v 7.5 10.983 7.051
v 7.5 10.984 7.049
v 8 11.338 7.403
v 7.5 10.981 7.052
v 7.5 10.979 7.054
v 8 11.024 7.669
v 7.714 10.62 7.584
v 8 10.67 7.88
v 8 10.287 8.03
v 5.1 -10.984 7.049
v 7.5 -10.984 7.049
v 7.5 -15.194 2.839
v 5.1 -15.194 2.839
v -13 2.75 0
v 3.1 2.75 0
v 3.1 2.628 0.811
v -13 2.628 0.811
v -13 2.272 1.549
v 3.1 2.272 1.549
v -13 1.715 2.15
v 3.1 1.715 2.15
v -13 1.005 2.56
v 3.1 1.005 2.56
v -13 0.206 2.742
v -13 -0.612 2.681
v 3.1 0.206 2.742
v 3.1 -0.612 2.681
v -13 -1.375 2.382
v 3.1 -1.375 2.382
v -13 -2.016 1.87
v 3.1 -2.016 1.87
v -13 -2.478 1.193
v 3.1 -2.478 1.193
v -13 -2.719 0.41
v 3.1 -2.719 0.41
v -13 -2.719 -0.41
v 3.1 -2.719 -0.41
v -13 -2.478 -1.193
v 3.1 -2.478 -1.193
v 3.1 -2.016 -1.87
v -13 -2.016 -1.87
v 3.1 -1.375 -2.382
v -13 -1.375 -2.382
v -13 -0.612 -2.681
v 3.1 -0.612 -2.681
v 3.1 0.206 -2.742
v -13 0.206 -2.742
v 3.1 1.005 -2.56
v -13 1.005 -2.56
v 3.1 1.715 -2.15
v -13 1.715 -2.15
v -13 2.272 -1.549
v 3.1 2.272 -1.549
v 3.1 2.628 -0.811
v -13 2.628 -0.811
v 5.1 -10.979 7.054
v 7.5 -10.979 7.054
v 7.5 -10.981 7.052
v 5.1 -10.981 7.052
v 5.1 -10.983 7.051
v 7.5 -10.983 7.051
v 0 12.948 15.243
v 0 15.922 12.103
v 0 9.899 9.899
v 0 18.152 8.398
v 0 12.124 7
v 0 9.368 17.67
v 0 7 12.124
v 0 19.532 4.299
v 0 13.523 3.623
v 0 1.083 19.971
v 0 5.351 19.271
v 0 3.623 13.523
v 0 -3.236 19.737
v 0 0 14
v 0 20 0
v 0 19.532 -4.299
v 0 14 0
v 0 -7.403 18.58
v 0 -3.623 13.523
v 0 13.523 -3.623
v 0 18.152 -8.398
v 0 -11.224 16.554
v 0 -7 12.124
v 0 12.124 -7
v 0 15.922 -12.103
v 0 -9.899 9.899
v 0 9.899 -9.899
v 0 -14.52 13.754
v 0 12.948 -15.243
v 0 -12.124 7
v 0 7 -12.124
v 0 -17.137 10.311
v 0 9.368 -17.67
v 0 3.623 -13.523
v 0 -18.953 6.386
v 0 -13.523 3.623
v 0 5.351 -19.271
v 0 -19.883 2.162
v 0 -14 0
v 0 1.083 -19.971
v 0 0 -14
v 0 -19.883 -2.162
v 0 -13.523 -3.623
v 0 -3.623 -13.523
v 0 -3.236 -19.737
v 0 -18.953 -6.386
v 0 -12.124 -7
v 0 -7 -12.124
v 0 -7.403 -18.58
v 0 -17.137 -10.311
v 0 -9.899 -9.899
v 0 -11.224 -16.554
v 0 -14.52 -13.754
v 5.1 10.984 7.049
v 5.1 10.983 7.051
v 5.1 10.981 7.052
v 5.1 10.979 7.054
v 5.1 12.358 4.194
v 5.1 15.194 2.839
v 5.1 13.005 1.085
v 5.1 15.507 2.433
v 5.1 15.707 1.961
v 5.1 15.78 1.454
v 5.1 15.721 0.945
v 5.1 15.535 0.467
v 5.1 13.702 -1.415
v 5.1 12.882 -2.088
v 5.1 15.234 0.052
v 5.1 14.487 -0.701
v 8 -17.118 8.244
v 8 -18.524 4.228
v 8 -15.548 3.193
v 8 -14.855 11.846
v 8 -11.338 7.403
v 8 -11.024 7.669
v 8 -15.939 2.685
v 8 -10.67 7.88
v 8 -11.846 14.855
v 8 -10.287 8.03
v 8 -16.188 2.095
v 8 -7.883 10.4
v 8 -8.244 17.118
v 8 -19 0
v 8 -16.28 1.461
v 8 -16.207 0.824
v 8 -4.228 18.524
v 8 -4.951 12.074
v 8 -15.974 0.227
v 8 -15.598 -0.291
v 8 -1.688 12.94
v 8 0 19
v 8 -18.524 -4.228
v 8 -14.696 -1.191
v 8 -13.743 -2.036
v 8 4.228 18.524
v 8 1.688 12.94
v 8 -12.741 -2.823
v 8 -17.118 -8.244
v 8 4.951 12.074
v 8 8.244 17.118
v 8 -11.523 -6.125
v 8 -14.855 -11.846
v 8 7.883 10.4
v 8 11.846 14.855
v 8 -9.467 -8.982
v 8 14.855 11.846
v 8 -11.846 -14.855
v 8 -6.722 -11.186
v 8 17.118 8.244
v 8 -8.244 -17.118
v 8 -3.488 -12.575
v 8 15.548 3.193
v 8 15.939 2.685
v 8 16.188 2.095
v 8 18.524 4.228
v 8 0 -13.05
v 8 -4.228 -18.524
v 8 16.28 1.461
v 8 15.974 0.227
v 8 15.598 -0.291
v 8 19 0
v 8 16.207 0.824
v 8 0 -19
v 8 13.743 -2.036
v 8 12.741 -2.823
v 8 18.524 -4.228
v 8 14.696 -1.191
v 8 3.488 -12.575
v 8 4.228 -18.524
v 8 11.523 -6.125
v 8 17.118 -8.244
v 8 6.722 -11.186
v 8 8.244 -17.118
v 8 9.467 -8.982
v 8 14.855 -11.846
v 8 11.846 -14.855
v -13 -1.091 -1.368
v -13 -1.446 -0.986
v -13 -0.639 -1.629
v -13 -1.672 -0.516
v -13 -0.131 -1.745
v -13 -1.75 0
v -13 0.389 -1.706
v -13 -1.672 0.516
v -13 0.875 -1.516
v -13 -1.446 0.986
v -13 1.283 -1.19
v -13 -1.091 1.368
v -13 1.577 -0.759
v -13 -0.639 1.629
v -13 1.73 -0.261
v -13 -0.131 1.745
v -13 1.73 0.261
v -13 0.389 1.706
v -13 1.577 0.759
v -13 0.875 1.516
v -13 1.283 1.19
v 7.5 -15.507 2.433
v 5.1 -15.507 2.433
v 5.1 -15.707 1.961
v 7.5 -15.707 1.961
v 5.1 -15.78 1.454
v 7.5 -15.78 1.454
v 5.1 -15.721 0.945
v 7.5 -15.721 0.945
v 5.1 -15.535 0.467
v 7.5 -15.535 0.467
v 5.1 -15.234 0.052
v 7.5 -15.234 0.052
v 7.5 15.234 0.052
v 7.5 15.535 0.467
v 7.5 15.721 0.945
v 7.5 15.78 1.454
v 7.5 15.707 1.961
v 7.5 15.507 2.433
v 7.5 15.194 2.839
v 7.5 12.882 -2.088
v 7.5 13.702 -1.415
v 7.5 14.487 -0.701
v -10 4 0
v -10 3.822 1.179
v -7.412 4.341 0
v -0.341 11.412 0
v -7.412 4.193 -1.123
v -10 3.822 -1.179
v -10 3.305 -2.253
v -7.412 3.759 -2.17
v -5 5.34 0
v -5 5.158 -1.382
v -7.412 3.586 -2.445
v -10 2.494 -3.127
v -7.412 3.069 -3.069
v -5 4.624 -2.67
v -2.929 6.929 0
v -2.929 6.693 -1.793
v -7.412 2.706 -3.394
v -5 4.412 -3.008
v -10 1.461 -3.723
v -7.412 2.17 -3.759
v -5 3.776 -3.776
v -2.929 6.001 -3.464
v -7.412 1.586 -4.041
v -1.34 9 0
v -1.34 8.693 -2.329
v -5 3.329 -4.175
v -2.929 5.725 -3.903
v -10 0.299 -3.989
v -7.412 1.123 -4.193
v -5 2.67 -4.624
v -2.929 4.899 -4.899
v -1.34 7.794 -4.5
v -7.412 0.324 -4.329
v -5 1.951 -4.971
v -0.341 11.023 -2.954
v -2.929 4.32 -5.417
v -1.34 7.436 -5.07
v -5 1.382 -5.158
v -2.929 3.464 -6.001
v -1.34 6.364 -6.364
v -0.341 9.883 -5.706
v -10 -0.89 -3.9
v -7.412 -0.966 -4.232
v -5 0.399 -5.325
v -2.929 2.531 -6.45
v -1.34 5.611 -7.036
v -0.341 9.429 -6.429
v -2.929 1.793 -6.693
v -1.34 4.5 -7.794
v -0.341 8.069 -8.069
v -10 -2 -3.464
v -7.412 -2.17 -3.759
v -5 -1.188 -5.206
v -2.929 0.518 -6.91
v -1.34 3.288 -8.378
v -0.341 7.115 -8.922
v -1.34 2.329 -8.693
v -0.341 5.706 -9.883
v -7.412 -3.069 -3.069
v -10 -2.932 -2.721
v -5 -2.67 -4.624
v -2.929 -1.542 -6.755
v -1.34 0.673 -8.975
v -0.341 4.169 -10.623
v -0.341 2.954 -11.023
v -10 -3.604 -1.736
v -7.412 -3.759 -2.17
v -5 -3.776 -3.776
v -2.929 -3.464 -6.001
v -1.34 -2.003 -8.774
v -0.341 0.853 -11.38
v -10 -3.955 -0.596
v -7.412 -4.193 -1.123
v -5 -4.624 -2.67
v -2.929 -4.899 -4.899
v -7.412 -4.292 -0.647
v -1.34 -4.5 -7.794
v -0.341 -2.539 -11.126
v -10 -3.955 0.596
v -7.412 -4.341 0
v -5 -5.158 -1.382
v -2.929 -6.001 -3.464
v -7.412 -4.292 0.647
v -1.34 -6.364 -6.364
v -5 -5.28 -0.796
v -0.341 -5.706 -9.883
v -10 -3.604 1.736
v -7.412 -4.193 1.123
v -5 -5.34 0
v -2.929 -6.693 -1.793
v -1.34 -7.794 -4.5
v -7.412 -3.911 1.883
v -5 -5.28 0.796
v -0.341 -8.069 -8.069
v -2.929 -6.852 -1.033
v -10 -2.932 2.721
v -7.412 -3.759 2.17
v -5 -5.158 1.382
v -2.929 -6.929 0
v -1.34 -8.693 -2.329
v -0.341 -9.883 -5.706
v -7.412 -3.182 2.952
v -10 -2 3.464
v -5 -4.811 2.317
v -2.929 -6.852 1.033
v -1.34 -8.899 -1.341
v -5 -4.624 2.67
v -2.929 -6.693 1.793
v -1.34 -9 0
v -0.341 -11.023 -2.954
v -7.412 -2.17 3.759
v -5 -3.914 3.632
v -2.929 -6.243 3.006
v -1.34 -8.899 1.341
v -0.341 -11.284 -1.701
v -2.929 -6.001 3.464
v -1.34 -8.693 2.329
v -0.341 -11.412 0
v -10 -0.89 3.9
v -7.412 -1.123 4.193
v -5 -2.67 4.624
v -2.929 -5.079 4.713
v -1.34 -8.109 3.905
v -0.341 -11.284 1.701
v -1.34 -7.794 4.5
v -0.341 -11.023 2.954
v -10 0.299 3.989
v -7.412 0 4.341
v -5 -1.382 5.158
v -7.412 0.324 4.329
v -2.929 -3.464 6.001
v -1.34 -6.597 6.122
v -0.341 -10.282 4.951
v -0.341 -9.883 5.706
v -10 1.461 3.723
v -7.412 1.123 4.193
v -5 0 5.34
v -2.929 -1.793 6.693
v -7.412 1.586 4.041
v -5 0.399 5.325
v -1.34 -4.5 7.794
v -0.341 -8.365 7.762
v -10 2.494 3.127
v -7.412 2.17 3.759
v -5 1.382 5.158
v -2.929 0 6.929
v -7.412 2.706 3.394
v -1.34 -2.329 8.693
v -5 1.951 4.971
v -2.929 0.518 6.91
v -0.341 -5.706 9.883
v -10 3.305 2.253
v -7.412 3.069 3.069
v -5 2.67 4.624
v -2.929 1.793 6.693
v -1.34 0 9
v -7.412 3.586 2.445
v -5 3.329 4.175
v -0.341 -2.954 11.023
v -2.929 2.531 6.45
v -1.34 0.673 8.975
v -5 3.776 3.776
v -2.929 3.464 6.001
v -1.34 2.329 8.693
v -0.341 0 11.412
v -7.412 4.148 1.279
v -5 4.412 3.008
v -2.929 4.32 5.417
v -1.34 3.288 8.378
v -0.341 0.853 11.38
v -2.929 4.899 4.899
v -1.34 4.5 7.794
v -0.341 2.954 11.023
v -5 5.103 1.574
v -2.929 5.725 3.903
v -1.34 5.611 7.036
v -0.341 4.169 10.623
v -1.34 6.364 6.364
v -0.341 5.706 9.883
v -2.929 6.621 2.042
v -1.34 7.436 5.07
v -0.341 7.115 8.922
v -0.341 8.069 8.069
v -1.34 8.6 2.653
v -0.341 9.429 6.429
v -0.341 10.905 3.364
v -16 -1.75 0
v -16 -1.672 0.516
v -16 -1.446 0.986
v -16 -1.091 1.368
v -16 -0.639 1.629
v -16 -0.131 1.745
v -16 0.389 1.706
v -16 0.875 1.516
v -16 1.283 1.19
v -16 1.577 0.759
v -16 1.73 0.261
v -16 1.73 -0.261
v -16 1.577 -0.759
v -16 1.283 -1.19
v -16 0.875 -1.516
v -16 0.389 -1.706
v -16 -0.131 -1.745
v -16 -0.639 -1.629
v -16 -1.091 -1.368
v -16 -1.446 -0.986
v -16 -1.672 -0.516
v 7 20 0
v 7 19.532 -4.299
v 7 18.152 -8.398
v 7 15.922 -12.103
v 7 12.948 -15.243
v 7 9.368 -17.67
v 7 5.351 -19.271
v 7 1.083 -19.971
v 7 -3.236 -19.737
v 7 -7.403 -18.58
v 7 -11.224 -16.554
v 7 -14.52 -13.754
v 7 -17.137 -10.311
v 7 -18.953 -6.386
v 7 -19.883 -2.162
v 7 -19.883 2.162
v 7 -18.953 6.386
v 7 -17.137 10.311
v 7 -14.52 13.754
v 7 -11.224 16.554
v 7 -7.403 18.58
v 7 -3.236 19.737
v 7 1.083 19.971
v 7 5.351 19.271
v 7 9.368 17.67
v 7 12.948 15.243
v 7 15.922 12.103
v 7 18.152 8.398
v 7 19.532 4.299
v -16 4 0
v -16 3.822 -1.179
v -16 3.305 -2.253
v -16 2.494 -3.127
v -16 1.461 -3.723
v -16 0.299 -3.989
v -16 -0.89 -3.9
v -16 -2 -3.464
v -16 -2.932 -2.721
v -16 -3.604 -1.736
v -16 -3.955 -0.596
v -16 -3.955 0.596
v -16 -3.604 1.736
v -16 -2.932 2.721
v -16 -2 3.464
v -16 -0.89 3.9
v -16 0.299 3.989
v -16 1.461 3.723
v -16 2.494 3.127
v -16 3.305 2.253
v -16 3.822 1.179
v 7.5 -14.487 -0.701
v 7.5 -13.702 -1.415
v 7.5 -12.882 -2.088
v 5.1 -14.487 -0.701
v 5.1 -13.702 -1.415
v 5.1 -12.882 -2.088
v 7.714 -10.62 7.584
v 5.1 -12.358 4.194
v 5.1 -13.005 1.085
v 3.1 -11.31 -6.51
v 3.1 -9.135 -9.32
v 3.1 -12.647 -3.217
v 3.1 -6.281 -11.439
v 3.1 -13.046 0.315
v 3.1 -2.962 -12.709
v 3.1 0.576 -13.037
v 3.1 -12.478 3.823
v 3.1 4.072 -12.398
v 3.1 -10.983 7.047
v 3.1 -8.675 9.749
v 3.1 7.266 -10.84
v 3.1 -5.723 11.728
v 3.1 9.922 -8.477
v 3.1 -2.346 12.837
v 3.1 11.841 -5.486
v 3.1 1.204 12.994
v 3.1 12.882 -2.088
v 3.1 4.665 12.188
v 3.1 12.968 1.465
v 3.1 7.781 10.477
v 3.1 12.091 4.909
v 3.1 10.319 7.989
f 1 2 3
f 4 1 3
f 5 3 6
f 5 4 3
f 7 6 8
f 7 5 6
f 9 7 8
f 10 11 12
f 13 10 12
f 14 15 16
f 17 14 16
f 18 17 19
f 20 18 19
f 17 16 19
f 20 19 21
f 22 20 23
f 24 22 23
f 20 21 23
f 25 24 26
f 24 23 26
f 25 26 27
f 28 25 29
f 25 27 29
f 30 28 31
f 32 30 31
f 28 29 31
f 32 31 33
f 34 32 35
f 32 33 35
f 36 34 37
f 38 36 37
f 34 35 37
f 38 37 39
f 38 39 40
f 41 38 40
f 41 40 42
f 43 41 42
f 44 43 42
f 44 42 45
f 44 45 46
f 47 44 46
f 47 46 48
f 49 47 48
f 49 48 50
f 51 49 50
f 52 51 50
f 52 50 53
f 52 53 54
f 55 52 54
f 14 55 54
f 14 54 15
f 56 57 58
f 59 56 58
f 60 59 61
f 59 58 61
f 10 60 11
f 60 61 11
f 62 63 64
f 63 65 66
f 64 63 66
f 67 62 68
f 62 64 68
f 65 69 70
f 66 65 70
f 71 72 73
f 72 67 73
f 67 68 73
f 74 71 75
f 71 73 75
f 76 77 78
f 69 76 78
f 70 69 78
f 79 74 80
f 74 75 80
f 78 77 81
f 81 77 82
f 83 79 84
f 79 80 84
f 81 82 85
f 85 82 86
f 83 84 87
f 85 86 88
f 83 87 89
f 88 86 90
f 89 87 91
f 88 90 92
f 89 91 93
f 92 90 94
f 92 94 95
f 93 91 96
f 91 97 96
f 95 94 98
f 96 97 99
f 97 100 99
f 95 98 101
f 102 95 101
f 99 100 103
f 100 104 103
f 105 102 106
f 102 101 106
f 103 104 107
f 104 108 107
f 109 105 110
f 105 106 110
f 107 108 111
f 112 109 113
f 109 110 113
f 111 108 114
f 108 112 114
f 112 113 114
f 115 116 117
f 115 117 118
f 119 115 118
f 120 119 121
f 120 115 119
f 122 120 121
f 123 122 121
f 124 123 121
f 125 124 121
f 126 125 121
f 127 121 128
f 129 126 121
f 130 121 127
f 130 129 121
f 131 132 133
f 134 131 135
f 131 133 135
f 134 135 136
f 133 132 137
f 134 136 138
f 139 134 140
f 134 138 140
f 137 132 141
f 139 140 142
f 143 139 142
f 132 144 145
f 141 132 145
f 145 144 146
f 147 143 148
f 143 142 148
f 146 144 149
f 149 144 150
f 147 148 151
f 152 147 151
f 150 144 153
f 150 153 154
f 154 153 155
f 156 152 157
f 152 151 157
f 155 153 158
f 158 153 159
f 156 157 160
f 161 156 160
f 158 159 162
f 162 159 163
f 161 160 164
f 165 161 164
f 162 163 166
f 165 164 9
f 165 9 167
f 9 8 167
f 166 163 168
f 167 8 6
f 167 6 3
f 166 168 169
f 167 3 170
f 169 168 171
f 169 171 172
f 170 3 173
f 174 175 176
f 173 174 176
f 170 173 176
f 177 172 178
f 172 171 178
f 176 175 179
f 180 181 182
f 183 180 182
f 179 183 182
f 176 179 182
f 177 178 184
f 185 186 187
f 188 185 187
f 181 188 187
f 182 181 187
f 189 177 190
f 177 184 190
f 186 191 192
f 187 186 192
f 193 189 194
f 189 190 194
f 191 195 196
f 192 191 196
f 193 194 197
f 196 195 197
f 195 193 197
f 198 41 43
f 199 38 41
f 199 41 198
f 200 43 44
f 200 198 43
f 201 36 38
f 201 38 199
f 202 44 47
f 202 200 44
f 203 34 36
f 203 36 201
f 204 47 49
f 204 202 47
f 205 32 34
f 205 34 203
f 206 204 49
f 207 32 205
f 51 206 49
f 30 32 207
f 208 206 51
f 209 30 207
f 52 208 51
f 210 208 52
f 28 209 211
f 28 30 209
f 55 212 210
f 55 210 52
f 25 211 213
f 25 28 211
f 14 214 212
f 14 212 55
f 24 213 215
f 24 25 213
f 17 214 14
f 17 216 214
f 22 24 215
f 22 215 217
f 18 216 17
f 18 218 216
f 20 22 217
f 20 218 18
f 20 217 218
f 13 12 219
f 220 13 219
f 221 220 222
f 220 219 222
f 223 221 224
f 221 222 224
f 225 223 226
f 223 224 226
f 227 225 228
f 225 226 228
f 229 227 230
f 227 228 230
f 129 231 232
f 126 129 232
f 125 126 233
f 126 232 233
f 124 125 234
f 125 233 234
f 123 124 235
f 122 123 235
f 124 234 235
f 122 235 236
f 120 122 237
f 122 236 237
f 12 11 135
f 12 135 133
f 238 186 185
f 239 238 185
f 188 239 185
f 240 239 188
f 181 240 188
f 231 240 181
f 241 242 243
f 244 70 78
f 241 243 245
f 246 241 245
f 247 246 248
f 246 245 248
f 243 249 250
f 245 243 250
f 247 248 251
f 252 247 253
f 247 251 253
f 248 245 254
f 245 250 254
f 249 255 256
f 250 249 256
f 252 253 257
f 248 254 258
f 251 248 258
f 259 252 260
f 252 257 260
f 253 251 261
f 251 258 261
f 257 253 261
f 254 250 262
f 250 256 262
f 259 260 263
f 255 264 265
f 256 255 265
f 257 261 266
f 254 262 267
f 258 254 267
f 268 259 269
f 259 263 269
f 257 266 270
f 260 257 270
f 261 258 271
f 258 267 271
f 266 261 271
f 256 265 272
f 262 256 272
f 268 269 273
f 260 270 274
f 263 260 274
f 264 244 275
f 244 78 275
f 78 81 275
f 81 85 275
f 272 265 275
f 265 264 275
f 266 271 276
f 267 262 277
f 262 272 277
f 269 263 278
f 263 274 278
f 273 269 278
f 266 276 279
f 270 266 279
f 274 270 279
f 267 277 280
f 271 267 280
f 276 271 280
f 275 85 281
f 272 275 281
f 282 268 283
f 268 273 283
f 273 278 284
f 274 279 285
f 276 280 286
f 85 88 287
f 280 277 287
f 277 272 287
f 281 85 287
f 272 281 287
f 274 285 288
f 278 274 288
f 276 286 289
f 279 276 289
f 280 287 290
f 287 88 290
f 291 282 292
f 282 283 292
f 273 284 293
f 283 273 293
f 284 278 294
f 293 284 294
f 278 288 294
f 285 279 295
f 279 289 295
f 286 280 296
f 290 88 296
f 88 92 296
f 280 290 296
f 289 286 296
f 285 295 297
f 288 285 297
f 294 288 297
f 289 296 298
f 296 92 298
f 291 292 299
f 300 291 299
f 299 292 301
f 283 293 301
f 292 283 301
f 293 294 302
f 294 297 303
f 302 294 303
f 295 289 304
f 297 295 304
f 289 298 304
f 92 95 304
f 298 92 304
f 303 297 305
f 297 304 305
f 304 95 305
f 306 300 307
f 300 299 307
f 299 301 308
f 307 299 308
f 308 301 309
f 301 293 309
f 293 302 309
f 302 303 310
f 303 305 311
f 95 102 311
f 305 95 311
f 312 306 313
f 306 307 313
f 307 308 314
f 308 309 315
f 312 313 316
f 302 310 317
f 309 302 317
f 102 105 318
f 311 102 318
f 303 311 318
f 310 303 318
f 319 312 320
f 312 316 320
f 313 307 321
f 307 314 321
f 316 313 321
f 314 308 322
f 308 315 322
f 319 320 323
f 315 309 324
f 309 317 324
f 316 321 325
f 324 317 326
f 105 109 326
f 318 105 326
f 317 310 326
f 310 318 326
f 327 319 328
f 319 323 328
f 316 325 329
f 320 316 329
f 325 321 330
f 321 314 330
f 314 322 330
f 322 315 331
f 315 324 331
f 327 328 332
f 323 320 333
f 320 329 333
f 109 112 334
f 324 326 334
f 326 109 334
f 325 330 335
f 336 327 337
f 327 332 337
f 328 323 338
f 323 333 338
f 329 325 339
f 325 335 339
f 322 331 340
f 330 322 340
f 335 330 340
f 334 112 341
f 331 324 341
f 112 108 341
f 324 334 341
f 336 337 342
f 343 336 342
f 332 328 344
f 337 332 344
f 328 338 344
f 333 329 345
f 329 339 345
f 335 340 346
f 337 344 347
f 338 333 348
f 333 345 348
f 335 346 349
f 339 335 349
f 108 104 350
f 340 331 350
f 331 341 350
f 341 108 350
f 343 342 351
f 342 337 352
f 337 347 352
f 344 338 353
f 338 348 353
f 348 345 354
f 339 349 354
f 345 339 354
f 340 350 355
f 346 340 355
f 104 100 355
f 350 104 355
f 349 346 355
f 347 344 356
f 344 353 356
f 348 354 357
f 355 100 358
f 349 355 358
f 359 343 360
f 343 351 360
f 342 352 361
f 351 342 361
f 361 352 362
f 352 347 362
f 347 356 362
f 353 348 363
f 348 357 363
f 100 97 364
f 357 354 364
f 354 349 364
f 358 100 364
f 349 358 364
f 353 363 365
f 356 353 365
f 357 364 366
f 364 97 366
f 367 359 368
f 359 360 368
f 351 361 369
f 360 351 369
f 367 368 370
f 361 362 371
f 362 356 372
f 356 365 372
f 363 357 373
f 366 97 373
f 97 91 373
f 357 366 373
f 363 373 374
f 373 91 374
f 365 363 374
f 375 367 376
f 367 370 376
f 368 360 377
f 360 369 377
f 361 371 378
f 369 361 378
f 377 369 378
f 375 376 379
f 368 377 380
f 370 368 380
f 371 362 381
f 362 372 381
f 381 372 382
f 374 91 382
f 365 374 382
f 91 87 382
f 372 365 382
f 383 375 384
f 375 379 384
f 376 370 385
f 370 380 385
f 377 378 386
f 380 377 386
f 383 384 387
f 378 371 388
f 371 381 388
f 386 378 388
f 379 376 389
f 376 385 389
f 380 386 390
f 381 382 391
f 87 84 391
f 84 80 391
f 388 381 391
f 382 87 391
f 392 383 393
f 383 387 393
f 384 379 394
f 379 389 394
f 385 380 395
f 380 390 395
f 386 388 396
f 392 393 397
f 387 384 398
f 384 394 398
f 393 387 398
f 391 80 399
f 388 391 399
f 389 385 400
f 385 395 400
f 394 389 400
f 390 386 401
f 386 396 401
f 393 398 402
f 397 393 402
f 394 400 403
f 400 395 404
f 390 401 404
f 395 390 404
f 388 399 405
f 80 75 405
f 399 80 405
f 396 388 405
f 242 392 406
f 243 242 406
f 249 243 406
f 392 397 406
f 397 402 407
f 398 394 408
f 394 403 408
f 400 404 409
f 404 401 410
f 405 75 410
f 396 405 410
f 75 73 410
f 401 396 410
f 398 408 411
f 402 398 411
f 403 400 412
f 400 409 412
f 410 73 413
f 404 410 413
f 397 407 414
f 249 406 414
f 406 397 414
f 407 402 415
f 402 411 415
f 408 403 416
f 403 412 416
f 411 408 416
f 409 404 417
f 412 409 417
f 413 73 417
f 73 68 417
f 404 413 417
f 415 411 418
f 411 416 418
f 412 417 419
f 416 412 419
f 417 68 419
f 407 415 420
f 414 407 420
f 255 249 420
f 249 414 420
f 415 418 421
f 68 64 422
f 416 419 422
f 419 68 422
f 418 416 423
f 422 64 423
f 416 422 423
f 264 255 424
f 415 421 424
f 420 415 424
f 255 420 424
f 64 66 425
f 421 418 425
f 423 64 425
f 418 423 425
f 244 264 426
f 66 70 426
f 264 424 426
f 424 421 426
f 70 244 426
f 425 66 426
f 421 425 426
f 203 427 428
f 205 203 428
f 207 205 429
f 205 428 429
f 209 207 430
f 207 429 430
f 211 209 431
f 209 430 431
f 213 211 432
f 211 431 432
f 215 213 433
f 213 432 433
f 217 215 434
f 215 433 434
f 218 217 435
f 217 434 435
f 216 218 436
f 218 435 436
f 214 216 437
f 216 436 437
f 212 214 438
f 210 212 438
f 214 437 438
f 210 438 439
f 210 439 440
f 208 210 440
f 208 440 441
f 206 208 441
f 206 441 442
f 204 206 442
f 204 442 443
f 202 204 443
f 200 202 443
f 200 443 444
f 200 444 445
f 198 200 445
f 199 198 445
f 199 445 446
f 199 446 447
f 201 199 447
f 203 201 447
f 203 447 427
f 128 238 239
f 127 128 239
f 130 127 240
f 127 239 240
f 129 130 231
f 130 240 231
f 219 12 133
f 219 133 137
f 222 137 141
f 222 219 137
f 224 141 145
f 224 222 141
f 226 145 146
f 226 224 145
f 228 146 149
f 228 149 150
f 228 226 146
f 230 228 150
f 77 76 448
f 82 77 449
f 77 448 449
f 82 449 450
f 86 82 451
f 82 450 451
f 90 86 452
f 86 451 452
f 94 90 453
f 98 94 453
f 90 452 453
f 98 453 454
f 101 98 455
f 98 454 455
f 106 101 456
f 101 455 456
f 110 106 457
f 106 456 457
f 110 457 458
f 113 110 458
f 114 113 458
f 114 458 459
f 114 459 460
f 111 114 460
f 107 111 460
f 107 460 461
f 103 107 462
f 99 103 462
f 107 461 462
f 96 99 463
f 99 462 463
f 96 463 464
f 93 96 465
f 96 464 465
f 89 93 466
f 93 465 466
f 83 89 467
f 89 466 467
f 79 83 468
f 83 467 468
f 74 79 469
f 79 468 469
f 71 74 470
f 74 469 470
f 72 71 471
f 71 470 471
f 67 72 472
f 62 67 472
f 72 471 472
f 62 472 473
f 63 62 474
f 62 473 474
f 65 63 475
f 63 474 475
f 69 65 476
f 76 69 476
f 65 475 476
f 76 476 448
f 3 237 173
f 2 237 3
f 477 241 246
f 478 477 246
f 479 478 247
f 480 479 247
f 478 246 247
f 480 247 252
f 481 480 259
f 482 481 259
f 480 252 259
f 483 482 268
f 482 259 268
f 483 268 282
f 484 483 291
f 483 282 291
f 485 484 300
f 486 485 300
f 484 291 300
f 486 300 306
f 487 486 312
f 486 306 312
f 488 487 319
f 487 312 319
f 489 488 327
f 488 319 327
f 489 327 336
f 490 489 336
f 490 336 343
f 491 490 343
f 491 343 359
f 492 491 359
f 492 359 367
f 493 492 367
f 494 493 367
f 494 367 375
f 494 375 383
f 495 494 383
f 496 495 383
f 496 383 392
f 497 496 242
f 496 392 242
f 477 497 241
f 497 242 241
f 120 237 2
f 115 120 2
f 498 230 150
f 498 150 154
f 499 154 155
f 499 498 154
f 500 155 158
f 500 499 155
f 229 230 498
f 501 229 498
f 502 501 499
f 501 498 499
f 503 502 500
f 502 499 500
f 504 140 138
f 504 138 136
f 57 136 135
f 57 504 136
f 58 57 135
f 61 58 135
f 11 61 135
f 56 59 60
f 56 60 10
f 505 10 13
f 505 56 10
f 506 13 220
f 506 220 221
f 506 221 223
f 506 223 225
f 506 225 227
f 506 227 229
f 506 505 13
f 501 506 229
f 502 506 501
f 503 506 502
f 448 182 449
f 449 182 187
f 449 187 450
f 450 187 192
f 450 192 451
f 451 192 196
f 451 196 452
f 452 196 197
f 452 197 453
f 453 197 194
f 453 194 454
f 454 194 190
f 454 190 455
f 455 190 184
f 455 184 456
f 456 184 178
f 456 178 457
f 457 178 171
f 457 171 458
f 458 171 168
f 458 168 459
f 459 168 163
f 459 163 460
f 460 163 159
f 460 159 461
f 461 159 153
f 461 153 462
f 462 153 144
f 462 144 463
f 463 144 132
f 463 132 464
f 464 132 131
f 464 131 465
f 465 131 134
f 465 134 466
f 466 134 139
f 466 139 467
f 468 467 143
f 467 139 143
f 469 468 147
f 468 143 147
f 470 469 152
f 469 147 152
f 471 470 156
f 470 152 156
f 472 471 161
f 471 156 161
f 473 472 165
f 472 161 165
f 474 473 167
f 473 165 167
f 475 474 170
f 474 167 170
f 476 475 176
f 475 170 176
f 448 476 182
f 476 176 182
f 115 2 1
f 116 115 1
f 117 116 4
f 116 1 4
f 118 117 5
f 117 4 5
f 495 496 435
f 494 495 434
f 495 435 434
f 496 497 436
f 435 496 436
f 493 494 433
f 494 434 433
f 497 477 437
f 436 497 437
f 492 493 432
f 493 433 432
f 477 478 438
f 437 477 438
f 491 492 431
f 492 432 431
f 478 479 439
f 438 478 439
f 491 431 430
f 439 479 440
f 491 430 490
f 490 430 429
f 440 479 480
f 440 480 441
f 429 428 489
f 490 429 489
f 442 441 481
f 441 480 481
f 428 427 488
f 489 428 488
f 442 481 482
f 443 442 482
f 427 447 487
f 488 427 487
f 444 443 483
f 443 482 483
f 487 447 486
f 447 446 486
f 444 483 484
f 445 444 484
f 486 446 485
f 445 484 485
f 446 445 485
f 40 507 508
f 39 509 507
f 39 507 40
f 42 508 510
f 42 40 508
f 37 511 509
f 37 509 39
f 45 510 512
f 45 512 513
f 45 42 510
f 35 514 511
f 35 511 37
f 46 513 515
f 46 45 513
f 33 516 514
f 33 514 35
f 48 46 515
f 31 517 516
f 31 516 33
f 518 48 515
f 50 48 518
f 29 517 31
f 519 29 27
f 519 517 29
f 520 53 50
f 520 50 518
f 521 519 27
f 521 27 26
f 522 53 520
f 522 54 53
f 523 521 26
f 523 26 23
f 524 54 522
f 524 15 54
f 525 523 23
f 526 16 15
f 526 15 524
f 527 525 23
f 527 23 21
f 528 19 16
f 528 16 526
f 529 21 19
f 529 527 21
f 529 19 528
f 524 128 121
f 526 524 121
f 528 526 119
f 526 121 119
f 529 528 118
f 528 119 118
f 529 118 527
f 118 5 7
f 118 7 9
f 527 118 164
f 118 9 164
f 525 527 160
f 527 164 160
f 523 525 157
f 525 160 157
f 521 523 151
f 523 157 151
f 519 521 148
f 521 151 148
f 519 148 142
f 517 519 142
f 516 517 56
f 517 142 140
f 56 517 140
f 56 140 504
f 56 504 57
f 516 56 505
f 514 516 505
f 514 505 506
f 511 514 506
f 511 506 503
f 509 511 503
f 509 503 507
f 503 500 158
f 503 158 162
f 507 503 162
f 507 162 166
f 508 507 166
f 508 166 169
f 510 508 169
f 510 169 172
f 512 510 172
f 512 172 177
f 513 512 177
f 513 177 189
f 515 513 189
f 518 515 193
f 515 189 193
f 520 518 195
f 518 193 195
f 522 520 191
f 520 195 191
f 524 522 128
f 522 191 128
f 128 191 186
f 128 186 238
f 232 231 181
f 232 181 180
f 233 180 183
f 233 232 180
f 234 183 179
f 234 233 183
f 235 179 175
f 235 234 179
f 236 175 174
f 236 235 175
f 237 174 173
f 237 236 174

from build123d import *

# Parameters (mm, degrees)
CORTAR_EXTRUIR1_DEPTH = 2.9
REDONDEO1_R           = 10
CORTAR_EXTRUIR2_REACH = 39.094
CROQUIS3_R            = 1.75
CROQUIS4_R            = 2.75
CORTAR_EXTRUIR3_DEPTH = 18.1
CHAFL_N1_SIZE         = 1
CHAFL_N2_SIZE         = 0.5
CROQUIS5_R            = 13.05
CORTAR_EXTRUIR4_DEPTH = 4.9


with BuildPart() as part:
    # Croquis1 → Revolución1 (revolve)
    with BuildSketch(Plane.XY):
        Polygon((-16, 0), (-16, 4), (0, 4), (0, 20), (8, 20), (8, 0), align=None)
    revolve(axis=Axis((8, 0, 0), (-1, 0, 0)))

    # Croquis2 → Cortar-Extruir1 (cut)
    with BuildSketch(Plane(origin=(8, 0, 0), x_dir=(0, 0, -1), z_dir=(1, 0, 0))):
        with BuildLine():
            Line((-2.839199656, 15.194118815), (-7.049029232, 10.984289239))
            ThreePointArc((-7.049029232, 10.984289239), (-7.634375098, 9.528098398), (-6.988431485, 8.097756342))
            ThreePointArc((-6.988431485, 8.097756342), (-3.433318471, 0), (-6.988431485, -8.097756342))
            ThreePointArc((-6.988431485, -8.097756342), (-7.634375098, -9.528098398), (-7.049029232, -10.984289239))
            Line((-7.049029232, -10.984289239), (-2.839199656, -15.194118815))
            ThreePointArc((-2.839199656, -15.194118815), (-1.453779812, -15.779697972), (-0.052075025, -15.234248815))
            ThreePointArc((-0.052075025, -15.234248815), (6.516681529, 0), (-0.052075025, 15.234248815))
            ThreePointArc((-0.052075025, 15.234248815), (-1.453779812, 15.779697972), (-2.839199656, 15.194118815))
        make_face()
    extrude(amount=-CORTAR_EXTRUIR1_DEPTH, mode=Mode.SUBTRACT)

    # Redondeo1
    redondeo1_edges = [part.edges().sort_by_distance(p)[0] for p in [
        (0, -4, 0),
    ]]
    fillet(redondeo1_edges, radius=REDONDEO1_R)

    # Croquis3 → Cortar-Extruir2 (cut, up to next)
    with BuildSketch(Plane.ZY.offset(16), mode=Mode.PRIVATE) as cortar_extruir2_sk1:
        with Locations(Location((0, 0, 0), (0, 0, 270))):
            Circle(CROQUIS3_R)
    cortar_extruir2_tool1 = extrude(cortar_extruir2_sk1.sketch, amount=-CORTAR_EXTRUIR2_REACH, mode=Mode.PRIVATE) & part.part
    add(cortar_extruir2_tool1.solids().sort_by_distance((-16, 0, 0))[0], mode=Mode.SUBTRACT)

    # Croquis4 → Cortar-Extruir3 (cut)
    with BuildSketch(Plane(origin=(5.1, 0, 0), x_dir=(0, 0, -1), z_dir=(1, 0, 0))):
        with Locations(Location((0, 0, 0), (0, 0, 90))):
            Circle(CROQUIS4_R)
    extrude(amount=-CORTAR_EXTRUIR3_DEPTH, mode=Mode.SUBTRACT)

    # Chaflán1
    chafl_n1_edges = [part.edges().sort_by_distance(p)[0] for p in [
        (8, -20, 0),
    ]]
    chamfer(chafl_n1_edges, length=CHAFL_N1_SIZE)

    # Chaflán2
    chafl_n2_edges = [part.edges().sort_by_distance(p)[0] for p in [
        (8, -15.779697972, 1.453779812),
        (8, 0, -6.516681529),
        (8, 15.779697972, 1.453779812),
        (8, 13.089204027, 4.944114444),
        (8, 9.528098398, 7.634375098),
        (8, 0, 3.433318471),
        (8, -9.528098398, 7.634375098),
        (8, -13.089204027, 4.944114444),
    ]]
    chamfer(chafl_n2_edges, length=CHAFL_N2_SIZE)

    # Croquis5 → Cortar-Extruir4 (cut)
    with BuildSketch(Plane(origin=(8, 0, 0), x_dir=(0, 0, -1), z_dir=(1, 0, 0))):
        with Locations(Location((0, 0, 0), (0, 0, 80.792213194))):
            Circle(CROQUIS5_R)
    extrude(amount=-CORTAR_EXTRUIR4_DEPTH, mode=Mode.SUBTRACT)


solid = part.part
